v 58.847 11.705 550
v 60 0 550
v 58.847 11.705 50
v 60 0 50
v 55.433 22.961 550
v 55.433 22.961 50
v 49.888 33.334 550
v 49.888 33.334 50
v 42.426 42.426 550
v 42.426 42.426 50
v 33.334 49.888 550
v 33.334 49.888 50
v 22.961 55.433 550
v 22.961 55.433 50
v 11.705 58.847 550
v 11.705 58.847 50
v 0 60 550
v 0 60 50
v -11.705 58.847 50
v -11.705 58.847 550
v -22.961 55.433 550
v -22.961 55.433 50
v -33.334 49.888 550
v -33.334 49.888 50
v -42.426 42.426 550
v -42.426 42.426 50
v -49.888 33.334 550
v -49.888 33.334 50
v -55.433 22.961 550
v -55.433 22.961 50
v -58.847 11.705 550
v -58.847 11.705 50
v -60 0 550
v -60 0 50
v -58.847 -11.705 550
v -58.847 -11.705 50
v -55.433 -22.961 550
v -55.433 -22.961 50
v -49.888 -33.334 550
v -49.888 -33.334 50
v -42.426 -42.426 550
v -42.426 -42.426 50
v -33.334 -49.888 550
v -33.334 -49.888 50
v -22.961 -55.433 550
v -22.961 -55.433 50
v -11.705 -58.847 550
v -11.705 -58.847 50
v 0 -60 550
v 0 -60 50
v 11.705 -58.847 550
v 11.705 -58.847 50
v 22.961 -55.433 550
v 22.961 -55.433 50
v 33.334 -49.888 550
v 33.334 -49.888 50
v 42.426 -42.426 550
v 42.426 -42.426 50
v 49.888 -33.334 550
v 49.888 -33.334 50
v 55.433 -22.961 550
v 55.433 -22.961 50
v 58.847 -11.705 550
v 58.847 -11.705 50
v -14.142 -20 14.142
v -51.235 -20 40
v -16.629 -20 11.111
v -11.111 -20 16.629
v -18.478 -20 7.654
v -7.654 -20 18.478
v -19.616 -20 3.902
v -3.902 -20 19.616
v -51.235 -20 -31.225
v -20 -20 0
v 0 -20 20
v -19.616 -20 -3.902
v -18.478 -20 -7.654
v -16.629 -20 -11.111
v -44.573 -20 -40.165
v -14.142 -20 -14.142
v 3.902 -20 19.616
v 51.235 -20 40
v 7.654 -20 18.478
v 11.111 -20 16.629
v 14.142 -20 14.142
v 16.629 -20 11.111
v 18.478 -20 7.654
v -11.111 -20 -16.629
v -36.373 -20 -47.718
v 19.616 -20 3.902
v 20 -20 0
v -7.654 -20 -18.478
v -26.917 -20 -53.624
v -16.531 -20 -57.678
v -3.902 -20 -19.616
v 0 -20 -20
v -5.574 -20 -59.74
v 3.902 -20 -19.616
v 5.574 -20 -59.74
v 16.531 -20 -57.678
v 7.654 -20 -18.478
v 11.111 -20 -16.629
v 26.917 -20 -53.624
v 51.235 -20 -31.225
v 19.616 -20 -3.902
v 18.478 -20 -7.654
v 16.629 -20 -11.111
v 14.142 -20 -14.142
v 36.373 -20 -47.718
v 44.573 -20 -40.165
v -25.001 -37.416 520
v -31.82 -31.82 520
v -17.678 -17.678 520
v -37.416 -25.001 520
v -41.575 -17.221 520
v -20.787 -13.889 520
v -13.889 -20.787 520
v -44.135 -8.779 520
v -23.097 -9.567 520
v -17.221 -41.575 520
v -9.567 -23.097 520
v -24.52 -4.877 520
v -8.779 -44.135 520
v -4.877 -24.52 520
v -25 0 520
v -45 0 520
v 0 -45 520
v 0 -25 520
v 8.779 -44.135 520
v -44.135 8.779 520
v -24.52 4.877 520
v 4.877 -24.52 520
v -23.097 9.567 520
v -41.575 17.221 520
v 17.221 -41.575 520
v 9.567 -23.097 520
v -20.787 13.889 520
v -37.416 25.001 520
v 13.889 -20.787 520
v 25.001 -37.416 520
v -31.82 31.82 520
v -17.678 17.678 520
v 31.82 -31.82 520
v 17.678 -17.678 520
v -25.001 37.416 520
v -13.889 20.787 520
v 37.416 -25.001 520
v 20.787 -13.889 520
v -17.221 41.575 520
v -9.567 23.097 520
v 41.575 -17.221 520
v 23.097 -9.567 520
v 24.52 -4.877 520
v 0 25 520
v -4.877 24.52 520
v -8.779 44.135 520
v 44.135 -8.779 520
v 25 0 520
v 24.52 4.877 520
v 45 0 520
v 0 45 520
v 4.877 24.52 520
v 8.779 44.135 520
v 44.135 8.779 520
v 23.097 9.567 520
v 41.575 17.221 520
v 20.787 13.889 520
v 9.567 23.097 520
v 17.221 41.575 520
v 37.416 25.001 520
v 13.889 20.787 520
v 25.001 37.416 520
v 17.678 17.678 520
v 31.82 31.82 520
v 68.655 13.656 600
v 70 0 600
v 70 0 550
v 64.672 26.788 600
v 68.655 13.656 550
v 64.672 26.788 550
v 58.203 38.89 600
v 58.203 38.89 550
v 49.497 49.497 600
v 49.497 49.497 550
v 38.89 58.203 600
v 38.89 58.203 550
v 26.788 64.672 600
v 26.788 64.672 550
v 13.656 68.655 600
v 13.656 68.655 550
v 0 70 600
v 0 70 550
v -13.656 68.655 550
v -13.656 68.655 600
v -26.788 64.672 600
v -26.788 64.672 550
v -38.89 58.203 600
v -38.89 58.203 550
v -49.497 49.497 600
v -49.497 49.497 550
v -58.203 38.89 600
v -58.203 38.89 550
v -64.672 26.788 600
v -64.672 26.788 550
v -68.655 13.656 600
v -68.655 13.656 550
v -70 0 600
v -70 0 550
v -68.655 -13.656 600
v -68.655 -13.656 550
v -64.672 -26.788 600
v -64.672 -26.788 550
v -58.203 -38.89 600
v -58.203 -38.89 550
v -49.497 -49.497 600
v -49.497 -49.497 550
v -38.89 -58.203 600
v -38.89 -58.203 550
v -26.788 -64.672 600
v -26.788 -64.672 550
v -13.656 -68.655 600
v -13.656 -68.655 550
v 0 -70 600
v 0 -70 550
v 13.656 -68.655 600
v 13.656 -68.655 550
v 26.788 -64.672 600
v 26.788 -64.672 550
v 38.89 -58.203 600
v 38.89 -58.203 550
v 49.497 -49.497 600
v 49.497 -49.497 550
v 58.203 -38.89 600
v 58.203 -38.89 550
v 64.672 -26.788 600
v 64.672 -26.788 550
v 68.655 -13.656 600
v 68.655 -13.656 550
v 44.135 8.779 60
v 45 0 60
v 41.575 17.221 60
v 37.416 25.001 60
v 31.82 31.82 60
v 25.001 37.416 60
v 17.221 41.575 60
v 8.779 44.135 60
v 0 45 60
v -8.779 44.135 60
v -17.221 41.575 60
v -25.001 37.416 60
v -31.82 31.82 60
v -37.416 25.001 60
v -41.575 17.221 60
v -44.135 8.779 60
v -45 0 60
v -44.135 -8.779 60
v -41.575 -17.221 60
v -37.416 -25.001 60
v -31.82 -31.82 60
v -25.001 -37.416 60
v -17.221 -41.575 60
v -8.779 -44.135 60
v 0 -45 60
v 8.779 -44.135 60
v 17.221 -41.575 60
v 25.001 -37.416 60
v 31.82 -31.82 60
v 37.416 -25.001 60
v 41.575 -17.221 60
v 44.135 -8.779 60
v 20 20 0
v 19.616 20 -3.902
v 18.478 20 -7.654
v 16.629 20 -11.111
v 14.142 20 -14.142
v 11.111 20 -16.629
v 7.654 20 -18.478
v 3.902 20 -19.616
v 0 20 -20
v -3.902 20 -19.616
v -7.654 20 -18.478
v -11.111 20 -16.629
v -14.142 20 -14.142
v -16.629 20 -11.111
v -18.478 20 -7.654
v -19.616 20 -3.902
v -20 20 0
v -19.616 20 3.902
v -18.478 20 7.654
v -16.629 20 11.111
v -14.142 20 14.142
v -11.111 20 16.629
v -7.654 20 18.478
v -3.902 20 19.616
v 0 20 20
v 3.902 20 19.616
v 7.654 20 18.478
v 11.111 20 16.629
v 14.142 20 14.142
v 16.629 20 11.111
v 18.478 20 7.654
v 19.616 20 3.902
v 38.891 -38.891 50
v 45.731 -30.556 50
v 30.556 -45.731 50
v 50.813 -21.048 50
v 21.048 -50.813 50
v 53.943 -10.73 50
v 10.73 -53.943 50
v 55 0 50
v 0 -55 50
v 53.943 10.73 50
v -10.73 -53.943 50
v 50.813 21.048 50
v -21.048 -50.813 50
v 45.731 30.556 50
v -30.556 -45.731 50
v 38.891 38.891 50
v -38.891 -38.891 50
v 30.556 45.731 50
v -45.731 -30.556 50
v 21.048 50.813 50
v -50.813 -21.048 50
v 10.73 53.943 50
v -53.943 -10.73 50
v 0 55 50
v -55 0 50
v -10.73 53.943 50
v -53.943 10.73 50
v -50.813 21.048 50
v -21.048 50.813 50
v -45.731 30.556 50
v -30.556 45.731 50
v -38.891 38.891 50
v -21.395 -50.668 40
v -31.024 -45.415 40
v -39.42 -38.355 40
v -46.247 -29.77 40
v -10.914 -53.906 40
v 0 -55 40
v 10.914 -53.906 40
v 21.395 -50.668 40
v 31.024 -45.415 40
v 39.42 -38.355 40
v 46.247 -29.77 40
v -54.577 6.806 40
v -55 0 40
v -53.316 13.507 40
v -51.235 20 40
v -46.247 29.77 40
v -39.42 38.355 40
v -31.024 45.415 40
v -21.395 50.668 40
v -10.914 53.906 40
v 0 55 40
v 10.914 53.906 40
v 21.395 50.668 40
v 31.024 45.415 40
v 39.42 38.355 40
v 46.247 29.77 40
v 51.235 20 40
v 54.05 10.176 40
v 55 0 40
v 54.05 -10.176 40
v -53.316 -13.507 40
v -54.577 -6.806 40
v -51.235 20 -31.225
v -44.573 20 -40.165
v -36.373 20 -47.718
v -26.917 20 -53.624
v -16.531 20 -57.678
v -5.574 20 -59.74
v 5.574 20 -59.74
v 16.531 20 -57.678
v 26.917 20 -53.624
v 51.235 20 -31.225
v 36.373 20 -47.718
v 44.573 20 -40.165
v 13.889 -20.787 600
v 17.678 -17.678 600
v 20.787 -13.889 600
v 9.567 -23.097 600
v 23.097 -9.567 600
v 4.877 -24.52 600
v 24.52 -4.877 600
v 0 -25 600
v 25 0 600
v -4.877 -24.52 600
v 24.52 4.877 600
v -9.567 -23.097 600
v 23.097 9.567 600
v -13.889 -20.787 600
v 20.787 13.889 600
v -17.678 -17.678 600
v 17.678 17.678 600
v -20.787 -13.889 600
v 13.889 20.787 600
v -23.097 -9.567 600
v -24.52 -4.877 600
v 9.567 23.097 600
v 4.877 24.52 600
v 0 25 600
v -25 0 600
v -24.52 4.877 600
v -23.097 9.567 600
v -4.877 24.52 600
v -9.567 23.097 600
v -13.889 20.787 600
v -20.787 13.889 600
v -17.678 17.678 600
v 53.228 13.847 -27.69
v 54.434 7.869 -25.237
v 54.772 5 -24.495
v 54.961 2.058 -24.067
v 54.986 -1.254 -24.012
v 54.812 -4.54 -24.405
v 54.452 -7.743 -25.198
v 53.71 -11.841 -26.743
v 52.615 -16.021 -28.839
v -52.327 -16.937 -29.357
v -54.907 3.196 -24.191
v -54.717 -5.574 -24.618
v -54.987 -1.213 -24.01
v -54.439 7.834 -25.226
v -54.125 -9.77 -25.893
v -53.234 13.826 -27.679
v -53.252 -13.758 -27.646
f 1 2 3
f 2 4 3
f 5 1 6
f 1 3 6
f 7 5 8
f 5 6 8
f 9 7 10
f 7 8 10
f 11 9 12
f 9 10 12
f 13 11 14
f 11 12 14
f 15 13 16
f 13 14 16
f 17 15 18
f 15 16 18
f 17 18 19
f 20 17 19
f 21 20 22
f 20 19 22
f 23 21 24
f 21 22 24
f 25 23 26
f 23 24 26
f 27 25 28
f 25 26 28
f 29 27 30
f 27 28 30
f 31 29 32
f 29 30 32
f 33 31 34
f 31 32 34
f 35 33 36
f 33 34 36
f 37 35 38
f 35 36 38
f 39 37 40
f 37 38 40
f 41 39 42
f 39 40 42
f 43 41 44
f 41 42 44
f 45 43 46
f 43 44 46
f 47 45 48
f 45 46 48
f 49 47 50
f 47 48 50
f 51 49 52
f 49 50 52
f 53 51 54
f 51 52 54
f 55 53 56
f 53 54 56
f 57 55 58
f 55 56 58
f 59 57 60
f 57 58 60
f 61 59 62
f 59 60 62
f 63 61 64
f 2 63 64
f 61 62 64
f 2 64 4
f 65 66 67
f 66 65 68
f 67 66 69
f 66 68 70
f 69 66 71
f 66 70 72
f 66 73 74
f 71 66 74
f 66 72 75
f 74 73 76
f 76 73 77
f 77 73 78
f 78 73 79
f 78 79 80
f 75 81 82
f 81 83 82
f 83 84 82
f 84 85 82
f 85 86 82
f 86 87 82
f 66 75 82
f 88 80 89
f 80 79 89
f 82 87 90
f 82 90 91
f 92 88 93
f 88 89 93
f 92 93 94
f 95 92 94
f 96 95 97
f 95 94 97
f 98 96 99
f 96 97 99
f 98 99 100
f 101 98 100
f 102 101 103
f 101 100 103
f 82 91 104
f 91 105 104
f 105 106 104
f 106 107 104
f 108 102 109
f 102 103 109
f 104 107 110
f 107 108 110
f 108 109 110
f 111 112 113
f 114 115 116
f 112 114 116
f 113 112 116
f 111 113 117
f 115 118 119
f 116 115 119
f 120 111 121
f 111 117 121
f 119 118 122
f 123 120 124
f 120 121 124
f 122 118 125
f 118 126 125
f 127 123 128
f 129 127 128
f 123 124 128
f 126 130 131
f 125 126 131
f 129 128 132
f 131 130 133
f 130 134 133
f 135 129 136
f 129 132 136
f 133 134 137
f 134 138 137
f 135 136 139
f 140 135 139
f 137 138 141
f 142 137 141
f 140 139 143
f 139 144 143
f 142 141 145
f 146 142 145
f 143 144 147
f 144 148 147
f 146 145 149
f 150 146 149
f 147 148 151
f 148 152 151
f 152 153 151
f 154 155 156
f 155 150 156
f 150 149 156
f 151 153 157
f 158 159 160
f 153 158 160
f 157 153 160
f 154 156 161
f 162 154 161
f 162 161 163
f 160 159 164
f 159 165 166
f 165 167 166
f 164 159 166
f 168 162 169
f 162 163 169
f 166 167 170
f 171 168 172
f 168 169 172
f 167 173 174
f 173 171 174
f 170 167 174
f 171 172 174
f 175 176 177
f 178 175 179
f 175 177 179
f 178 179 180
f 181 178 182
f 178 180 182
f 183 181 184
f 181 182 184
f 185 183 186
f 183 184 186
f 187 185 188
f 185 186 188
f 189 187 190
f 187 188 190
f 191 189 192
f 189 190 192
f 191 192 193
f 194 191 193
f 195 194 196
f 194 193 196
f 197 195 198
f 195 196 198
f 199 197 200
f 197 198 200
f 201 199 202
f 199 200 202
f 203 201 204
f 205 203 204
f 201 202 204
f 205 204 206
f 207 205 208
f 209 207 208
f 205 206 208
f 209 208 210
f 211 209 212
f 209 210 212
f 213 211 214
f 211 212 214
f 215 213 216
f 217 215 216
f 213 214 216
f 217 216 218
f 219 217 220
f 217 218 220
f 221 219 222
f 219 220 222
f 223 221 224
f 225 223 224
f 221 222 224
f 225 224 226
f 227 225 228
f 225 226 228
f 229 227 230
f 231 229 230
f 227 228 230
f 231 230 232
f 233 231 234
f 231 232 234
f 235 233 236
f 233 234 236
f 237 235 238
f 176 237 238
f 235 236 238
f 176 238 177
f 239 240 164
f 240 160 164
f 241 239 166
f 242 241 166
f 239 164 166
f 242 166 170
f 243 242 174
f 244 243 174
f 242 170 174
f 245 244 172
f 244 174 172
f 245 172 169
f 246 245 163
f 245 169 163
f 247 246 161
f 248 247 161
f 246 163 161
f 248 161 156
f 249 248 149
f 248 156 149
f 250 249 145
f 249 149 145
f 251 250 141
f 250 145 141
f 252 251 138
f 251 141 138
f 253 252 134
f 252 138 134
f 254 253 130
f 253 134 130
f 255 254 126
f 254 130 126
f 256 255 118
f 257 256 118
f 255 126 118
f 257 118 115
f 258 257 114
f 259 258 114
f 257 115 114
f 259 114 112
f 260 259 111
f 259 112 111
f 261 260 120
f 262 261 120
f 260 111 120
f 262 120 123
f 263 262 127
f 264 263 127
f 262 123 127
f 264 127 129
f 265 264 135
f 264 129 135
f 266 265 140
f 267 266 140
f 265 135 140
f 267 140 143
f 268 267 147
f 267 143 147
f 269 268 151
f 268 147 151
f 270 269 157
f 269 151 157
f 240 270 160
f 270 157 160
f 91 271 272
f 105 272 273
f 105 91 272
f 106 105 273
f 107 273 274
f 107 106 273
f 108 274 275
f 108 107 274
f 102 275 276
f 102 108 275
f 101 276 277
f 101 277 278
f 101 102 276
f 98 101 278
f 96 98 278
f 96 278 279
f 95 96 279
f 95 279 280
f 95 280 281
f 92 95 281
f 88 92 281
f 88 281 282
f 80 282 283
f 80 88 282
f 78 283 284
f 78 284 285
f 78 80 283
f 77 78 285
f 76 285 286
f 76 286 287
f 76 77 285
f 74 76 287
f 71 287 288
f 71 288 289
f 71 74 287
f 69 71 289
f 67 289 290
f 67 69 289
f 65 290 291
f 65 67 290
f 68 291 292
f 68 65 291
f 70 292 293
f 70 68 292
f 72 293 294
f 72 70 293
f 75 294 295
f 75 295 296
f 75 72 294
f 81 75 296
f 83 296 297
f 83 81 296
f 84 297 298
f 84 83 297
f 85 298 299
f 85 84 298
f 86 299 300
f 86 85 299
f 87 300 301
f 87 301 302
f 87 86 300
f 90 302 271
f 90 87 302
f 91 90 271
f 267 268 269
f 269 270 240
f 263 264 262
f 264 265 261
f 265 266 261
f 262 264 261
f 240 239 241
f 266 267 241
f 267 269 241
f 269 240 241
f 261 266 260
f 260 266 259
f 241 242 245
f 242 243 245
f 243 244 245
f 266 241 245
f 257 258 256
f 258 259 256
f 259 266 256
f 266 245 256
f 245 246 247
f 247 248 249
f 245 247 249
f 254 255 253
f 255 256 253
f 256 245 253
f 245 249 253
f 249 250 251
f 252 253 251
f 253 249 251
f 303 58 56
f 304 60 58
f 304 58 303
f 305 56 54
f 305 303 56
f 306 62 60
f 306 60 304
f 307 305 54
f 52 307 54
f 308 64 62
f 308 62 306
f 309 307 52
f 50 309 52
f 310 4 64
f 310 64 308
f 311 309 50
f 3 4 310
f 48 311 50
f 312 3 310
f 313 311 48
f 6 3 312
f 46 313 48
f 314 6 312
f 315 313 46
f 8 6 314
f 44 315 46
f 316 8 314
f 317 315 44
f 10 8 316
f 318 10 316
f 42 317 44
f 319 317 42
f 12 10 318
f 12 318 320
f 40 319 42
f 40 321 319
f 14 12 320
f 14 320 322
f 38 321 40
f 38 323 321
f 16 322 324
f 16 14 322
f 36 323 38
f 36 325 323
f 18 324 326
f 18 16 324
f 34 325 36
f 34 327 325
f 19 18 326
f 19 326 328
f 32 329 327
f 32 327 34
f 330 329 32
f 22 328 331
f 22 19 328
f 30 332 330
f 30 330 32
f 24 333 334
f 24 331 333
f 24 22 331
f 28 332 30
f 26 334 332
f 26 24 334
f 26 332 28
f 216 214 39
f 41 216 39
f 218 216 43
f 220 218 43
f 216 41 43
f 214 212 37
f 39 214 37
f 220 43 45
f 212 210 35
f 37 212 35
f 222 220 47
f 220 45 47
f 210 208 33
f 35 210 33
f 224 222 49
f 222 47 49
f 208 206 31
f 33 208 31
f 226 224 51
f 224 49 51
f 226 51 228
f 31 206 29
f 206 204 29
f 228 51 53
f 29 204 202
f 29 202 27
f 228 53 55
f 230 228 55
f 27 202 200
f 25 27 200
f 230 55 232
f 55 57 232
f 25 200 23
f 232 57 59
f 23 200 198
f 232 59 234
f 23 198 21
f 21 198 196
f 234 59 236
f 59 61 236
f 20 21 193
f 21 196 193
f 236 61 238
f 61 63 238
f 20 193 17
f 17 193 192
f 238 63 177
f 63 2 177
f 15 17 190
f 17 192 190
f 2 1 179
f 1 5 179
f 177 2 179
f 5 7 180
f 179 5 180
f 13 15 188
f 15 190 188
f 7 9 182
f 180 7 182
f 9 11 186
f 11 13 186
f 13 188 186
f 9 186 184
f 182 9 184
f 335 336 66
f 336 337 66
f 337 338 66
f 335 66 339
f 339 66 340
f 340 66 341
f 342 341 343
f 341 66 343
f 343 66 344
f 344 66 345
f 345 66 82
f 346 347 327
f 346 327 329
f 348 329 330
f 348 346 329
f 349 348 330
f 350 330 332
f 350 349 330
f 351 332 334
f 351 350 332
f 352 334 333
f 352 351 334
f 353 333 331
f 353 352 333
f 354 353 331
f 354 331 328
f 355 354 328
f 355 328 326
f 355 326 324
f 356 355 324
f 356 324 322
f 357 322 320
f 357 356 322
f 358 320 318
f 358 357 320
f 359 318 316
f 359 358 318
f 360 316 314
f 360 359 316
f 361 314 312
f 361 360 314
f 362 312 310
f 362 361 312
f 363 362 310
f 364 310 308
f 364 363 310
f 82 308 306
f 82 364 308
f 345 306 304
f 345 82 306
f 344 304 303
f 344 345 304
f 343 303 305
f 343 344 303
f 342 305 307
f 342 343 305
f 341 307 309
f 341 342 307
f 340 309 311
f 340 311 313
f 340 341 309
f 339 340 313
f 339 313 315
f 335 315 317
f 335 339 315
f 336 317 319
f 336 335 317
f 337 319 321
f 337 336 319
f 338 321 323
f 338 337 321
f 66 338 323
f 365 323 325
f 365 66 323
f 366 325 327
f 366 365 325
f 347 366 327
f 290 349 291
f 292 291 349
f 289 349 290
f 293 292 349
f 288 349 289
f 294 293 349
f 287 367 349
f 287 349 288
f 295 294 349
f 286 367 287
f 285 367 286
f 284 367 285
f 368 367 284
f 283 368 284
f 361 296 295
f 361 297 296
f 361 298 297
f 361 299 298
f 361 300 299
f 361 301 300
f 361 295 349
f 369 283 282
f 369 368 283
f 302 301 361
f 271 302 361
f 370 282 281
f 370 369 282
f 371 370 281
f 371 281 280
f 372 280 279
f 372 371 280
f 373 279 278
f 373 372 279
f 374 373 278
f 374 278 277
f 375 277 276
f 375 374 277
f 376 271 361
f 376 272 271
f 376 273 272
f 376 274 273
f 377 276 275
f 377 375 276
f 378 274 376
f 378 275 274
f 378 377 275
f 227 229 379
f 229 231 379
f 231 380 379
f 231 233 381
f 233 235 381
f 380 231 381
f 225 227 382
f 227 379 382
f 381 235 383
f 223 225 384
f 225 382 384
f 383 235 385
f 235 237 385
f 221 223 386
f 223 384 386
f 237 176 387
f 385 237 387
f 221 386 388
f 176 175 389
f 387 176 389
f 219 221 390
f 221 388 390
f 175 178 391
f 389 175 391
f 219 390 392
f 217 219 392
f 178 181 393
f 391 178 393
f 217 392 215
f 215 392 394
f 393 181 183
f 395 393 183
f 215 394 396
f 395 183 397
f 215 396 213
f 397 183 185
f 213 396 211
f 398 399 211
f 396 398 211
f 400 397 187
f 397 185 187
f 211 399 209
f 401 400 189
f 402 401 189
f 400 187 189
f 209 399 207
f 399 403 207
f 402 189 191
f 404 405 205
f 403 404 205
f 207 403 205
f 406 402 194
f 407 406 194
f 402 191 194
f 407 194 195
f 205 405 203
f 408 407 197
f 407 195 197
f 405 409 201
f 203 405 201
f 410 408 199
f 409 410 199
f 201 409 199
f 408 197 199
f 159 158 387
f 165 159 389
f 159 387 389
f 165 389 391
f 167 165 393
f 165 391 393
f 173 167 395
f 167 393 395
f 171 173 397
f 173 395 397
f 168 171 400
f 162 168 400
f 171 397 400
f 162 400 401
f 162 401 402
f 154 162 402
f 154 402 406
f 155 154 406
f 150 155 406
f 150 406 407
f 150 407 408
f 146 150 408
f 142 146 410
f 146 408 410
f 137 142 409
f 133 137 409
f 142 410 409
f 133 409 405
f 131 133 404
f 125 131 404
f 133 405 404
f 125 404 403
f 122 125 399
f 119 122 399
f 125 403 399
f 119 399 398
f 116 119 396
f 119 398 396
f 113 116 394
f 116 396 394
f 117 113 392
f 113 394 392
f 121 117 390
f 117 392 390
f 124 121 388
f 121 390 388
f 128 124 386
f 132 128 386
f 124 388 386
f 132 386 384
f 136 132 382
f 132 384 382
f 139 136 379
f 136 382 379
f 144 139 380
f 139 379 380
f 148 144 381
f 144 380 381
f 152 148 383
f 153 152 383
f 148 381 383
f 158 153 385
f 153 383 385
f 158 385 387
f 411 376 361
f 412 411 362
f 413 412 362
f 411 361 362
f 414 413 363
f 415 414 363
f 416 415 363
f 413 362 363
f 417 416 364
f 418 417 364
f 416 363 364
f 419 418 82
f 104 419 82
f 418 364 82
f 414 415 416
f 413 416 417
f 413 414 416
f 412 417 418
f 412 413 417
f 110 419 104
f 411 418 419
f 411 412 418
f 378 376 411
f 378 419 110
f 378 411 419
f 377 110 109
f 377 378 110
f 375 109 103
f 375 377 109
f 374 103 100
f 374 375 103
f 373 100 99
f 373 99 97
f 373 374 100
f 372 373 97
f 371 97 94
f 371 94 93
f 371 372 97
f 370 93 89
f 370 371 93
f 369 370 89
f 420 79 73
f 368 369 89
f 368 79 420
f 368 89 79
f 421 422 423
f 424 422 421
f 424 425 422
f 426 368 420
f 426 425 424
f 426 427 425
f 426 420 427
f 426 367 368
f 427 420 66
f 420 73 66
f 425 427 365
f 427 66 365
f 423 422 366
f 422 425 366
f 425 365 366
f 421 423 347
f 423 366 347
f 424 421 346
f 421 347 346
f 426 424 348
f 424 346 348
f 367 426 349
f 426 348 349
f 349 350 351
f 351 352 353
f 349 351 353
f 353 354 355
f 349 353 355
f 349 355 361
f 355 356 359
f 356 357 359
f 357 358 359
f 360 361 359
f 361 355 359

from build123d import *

# Parameters (mm, degrees)
SKETCH2_R               = 20
BOSS_EXTRUDE1_DEPTH     = 20
SKETCH3_R               = 63.245553203
SKETCH3_R_2             = 55
CUT_EXTRUDE1_DEPTH      = 101
CUT_EXTRUDE1_DEPTH_BACK = 10


with BuildPart() as part:
    # Sketch1 → Revolve1 (revolve)
    with BuildSketch(Plane(origin=(0, 0, 0), x_dir=(1, 0, 0), z_dir=(0, 1, 0))):
        Polygon((70, -600), (70, -550), (60, -550), (60, -40), (0, -40), (0, -60), (45, -60), (45, -520), (25, -520), (25, -600), align=None)
    revolve(axis=Axis((0, 0, 0), (0, 0, 1)))

    # Sketch2 → Boss-Extrude1 (add, symmetric)
    with BuildSketch(Plane(origin=(0, 0, 0), x_dir=(1, 0, 0), z_dir=(0, 1, 0))):
        with BuildLine():
            Line((60, -40), (60, 0))
            ThreePointArc((60, 0), (0, 60), (-60, 0))
            Line((-60, 0), (-60, -40))
            Line((-60, -40), (60, -40))
        make_face()
        Circle(SKETCH2_R, mode=Mode.SUBTRACT)
    extrude(amount=BOSS_EXTRUDE1_DEPTH, both=True)

    # Sketch3 → Cut-Extrude1 (cut, two sides)
    with BuildSketch(Plane(origin=(0, 0, 40), x_dir=(-1, 0, 0), z_dir=(0, 0, -1))) as cut_extrude1_sk:
        Circle(SKETCH3_R)
        Circle(SKETCH3_R_2, mode=Mode.SUBTRACT)
    extrude(amount=CUT_EXTRUDE1_DEPTH, mode=Mode.SUBTRACT)
    extrude(cut_extrude1_sk.sketch, amount=-CUT_EXTRUDE1_DEPTH_BACK, mode=Mode.SUBTRACT)


solid = part.part
